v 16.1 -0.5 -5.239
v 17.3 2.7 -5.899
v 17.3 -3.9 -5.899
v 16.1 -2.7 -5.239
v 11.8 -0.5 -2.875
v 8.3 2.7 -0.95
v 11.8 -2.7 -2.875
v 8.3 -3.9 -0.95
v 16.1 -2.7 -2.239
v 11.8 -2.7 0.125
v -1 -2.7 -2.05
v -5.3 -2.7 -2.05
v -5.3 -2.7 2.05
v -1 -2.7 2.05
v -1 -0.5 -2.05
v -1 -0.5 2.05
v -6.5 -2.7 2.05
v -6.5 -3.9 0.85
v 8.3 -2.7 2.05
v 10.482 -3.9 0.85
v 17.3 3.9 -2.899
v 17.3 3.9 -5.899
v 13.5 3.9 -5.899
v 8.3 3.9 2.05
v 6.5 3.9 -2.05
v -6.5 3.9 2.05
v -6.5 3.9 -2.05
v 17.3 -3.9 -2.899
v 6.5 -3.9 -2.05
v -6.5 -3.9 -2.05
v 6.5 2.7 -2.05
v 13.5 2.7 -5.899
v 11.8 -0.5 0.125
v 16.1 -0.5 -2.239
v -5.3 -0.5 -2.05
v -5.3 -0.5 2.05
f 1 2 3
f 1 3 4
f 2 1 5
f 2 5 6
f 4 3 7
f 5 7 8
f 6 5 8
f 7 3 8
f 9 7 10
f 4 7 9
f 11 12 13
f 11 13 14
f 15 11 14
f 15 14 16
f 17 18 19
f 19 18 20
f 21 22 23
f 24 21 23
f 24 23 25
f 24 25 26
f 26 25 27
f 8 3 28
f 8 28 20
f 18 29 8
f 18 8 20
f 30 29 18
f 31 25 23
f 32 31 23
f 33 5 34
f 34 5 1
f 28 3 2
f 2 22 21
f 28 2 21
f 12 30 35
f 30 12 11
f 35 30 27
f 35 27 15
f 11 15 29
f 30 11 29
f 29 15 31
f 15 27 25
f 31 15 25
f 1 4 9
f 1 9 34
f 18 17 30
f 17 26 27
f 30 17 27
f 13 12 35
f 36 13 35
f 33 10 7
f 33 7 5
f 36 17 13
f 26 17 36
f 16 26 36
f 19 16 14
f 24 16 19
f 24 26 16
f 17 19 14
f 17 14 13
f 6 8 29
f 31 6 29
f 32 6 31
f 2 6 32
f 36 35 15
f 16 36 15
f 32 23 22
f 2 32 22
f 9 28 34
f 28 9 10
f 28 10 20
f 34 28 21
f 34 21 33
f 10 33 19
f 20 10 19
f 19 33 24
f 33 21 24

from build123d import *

# Parameters (mm, degrees)
SKETCH1_W               = 13
SKETCH1_H               = 4.1
BOSS_EXTRUDE1_DEPTH     = 3.9
CUT_EXTRUDE1_DEPTH      = 6.6
CUT_EXTRUDE2_DEPTH      = 20.434185635
CUT_EXTRUDE2_DEPTH_BACK = 20.434185635
SKETCH3_W               = 4.3
SKETCH3_H               = 2.2
CHAMFER1_SIZE           = 1.2


with BuildPart() as part:
    # Sketch1 → Boss-Extrude1 (new, symmetric)
    with BuildSketch(Plane(origin=(0, 0, 0), x_dir=(1, 0, 0), z_dir=(0, 1, 0))):
        Polygon((13.499620547, 5.899061033), (17.3, 5.899061033), (17.3, 2.899061033), (8.3, -2.05), (6.5, -2.05), (6.5, 2.05), align=None)
        Rectangle(SKETCH1_W, SKETCH1_H)
    extrude(amount=BOSS_EXTRUDE1_DEPTH, both=True)

    # Sketch2 → Cut-Extrude1 (cut)
    with BuildSketch(Plane.XZ.offset(3.9)):
        Polygon((17.3, -5.899061033), (8.3, -0.95), (6.5, -2.05), (13.499620547, -5.899061033), align=None)
    extrude(amount=-CUT_EXTRUDE1_DEPTH, mode=Mode.SUBTRACT)

    # Sketch3 → Cut-Extrude2 (cut, two sides: drawn at the far end of the back side and taken through both)
    with BuildSketch(Plane.XY.offset(2.05).offset(-CUT_EXTRUDE2_DEPTH_BACK)):
        with Locations((-3.15, -1.6)):
            Rectangle(SKETCH3_W, SKETCH3_H)
        with Locations((13.95, -1.6)):
            Rectangle(SKETCH3_W, SKETCH3_H)
    extrude(amount=CUT_EXTRUDE2_DEPTH + CUT_EXTRUDE2_DEPTH_BACK, mode=Mode.SUBTRACT)

    # Chamfer1
    chamfer1_edges = [part.edges().sort_by_distance(p)[0] for p in [
        (0.9, -3.9, 2.05),
    ]]
    chamfer(chamfer1_edges, length=CHAMFER1_SIZE - 0.0001)  # a hair under: the kernel refuses the full size


solid = part.part
